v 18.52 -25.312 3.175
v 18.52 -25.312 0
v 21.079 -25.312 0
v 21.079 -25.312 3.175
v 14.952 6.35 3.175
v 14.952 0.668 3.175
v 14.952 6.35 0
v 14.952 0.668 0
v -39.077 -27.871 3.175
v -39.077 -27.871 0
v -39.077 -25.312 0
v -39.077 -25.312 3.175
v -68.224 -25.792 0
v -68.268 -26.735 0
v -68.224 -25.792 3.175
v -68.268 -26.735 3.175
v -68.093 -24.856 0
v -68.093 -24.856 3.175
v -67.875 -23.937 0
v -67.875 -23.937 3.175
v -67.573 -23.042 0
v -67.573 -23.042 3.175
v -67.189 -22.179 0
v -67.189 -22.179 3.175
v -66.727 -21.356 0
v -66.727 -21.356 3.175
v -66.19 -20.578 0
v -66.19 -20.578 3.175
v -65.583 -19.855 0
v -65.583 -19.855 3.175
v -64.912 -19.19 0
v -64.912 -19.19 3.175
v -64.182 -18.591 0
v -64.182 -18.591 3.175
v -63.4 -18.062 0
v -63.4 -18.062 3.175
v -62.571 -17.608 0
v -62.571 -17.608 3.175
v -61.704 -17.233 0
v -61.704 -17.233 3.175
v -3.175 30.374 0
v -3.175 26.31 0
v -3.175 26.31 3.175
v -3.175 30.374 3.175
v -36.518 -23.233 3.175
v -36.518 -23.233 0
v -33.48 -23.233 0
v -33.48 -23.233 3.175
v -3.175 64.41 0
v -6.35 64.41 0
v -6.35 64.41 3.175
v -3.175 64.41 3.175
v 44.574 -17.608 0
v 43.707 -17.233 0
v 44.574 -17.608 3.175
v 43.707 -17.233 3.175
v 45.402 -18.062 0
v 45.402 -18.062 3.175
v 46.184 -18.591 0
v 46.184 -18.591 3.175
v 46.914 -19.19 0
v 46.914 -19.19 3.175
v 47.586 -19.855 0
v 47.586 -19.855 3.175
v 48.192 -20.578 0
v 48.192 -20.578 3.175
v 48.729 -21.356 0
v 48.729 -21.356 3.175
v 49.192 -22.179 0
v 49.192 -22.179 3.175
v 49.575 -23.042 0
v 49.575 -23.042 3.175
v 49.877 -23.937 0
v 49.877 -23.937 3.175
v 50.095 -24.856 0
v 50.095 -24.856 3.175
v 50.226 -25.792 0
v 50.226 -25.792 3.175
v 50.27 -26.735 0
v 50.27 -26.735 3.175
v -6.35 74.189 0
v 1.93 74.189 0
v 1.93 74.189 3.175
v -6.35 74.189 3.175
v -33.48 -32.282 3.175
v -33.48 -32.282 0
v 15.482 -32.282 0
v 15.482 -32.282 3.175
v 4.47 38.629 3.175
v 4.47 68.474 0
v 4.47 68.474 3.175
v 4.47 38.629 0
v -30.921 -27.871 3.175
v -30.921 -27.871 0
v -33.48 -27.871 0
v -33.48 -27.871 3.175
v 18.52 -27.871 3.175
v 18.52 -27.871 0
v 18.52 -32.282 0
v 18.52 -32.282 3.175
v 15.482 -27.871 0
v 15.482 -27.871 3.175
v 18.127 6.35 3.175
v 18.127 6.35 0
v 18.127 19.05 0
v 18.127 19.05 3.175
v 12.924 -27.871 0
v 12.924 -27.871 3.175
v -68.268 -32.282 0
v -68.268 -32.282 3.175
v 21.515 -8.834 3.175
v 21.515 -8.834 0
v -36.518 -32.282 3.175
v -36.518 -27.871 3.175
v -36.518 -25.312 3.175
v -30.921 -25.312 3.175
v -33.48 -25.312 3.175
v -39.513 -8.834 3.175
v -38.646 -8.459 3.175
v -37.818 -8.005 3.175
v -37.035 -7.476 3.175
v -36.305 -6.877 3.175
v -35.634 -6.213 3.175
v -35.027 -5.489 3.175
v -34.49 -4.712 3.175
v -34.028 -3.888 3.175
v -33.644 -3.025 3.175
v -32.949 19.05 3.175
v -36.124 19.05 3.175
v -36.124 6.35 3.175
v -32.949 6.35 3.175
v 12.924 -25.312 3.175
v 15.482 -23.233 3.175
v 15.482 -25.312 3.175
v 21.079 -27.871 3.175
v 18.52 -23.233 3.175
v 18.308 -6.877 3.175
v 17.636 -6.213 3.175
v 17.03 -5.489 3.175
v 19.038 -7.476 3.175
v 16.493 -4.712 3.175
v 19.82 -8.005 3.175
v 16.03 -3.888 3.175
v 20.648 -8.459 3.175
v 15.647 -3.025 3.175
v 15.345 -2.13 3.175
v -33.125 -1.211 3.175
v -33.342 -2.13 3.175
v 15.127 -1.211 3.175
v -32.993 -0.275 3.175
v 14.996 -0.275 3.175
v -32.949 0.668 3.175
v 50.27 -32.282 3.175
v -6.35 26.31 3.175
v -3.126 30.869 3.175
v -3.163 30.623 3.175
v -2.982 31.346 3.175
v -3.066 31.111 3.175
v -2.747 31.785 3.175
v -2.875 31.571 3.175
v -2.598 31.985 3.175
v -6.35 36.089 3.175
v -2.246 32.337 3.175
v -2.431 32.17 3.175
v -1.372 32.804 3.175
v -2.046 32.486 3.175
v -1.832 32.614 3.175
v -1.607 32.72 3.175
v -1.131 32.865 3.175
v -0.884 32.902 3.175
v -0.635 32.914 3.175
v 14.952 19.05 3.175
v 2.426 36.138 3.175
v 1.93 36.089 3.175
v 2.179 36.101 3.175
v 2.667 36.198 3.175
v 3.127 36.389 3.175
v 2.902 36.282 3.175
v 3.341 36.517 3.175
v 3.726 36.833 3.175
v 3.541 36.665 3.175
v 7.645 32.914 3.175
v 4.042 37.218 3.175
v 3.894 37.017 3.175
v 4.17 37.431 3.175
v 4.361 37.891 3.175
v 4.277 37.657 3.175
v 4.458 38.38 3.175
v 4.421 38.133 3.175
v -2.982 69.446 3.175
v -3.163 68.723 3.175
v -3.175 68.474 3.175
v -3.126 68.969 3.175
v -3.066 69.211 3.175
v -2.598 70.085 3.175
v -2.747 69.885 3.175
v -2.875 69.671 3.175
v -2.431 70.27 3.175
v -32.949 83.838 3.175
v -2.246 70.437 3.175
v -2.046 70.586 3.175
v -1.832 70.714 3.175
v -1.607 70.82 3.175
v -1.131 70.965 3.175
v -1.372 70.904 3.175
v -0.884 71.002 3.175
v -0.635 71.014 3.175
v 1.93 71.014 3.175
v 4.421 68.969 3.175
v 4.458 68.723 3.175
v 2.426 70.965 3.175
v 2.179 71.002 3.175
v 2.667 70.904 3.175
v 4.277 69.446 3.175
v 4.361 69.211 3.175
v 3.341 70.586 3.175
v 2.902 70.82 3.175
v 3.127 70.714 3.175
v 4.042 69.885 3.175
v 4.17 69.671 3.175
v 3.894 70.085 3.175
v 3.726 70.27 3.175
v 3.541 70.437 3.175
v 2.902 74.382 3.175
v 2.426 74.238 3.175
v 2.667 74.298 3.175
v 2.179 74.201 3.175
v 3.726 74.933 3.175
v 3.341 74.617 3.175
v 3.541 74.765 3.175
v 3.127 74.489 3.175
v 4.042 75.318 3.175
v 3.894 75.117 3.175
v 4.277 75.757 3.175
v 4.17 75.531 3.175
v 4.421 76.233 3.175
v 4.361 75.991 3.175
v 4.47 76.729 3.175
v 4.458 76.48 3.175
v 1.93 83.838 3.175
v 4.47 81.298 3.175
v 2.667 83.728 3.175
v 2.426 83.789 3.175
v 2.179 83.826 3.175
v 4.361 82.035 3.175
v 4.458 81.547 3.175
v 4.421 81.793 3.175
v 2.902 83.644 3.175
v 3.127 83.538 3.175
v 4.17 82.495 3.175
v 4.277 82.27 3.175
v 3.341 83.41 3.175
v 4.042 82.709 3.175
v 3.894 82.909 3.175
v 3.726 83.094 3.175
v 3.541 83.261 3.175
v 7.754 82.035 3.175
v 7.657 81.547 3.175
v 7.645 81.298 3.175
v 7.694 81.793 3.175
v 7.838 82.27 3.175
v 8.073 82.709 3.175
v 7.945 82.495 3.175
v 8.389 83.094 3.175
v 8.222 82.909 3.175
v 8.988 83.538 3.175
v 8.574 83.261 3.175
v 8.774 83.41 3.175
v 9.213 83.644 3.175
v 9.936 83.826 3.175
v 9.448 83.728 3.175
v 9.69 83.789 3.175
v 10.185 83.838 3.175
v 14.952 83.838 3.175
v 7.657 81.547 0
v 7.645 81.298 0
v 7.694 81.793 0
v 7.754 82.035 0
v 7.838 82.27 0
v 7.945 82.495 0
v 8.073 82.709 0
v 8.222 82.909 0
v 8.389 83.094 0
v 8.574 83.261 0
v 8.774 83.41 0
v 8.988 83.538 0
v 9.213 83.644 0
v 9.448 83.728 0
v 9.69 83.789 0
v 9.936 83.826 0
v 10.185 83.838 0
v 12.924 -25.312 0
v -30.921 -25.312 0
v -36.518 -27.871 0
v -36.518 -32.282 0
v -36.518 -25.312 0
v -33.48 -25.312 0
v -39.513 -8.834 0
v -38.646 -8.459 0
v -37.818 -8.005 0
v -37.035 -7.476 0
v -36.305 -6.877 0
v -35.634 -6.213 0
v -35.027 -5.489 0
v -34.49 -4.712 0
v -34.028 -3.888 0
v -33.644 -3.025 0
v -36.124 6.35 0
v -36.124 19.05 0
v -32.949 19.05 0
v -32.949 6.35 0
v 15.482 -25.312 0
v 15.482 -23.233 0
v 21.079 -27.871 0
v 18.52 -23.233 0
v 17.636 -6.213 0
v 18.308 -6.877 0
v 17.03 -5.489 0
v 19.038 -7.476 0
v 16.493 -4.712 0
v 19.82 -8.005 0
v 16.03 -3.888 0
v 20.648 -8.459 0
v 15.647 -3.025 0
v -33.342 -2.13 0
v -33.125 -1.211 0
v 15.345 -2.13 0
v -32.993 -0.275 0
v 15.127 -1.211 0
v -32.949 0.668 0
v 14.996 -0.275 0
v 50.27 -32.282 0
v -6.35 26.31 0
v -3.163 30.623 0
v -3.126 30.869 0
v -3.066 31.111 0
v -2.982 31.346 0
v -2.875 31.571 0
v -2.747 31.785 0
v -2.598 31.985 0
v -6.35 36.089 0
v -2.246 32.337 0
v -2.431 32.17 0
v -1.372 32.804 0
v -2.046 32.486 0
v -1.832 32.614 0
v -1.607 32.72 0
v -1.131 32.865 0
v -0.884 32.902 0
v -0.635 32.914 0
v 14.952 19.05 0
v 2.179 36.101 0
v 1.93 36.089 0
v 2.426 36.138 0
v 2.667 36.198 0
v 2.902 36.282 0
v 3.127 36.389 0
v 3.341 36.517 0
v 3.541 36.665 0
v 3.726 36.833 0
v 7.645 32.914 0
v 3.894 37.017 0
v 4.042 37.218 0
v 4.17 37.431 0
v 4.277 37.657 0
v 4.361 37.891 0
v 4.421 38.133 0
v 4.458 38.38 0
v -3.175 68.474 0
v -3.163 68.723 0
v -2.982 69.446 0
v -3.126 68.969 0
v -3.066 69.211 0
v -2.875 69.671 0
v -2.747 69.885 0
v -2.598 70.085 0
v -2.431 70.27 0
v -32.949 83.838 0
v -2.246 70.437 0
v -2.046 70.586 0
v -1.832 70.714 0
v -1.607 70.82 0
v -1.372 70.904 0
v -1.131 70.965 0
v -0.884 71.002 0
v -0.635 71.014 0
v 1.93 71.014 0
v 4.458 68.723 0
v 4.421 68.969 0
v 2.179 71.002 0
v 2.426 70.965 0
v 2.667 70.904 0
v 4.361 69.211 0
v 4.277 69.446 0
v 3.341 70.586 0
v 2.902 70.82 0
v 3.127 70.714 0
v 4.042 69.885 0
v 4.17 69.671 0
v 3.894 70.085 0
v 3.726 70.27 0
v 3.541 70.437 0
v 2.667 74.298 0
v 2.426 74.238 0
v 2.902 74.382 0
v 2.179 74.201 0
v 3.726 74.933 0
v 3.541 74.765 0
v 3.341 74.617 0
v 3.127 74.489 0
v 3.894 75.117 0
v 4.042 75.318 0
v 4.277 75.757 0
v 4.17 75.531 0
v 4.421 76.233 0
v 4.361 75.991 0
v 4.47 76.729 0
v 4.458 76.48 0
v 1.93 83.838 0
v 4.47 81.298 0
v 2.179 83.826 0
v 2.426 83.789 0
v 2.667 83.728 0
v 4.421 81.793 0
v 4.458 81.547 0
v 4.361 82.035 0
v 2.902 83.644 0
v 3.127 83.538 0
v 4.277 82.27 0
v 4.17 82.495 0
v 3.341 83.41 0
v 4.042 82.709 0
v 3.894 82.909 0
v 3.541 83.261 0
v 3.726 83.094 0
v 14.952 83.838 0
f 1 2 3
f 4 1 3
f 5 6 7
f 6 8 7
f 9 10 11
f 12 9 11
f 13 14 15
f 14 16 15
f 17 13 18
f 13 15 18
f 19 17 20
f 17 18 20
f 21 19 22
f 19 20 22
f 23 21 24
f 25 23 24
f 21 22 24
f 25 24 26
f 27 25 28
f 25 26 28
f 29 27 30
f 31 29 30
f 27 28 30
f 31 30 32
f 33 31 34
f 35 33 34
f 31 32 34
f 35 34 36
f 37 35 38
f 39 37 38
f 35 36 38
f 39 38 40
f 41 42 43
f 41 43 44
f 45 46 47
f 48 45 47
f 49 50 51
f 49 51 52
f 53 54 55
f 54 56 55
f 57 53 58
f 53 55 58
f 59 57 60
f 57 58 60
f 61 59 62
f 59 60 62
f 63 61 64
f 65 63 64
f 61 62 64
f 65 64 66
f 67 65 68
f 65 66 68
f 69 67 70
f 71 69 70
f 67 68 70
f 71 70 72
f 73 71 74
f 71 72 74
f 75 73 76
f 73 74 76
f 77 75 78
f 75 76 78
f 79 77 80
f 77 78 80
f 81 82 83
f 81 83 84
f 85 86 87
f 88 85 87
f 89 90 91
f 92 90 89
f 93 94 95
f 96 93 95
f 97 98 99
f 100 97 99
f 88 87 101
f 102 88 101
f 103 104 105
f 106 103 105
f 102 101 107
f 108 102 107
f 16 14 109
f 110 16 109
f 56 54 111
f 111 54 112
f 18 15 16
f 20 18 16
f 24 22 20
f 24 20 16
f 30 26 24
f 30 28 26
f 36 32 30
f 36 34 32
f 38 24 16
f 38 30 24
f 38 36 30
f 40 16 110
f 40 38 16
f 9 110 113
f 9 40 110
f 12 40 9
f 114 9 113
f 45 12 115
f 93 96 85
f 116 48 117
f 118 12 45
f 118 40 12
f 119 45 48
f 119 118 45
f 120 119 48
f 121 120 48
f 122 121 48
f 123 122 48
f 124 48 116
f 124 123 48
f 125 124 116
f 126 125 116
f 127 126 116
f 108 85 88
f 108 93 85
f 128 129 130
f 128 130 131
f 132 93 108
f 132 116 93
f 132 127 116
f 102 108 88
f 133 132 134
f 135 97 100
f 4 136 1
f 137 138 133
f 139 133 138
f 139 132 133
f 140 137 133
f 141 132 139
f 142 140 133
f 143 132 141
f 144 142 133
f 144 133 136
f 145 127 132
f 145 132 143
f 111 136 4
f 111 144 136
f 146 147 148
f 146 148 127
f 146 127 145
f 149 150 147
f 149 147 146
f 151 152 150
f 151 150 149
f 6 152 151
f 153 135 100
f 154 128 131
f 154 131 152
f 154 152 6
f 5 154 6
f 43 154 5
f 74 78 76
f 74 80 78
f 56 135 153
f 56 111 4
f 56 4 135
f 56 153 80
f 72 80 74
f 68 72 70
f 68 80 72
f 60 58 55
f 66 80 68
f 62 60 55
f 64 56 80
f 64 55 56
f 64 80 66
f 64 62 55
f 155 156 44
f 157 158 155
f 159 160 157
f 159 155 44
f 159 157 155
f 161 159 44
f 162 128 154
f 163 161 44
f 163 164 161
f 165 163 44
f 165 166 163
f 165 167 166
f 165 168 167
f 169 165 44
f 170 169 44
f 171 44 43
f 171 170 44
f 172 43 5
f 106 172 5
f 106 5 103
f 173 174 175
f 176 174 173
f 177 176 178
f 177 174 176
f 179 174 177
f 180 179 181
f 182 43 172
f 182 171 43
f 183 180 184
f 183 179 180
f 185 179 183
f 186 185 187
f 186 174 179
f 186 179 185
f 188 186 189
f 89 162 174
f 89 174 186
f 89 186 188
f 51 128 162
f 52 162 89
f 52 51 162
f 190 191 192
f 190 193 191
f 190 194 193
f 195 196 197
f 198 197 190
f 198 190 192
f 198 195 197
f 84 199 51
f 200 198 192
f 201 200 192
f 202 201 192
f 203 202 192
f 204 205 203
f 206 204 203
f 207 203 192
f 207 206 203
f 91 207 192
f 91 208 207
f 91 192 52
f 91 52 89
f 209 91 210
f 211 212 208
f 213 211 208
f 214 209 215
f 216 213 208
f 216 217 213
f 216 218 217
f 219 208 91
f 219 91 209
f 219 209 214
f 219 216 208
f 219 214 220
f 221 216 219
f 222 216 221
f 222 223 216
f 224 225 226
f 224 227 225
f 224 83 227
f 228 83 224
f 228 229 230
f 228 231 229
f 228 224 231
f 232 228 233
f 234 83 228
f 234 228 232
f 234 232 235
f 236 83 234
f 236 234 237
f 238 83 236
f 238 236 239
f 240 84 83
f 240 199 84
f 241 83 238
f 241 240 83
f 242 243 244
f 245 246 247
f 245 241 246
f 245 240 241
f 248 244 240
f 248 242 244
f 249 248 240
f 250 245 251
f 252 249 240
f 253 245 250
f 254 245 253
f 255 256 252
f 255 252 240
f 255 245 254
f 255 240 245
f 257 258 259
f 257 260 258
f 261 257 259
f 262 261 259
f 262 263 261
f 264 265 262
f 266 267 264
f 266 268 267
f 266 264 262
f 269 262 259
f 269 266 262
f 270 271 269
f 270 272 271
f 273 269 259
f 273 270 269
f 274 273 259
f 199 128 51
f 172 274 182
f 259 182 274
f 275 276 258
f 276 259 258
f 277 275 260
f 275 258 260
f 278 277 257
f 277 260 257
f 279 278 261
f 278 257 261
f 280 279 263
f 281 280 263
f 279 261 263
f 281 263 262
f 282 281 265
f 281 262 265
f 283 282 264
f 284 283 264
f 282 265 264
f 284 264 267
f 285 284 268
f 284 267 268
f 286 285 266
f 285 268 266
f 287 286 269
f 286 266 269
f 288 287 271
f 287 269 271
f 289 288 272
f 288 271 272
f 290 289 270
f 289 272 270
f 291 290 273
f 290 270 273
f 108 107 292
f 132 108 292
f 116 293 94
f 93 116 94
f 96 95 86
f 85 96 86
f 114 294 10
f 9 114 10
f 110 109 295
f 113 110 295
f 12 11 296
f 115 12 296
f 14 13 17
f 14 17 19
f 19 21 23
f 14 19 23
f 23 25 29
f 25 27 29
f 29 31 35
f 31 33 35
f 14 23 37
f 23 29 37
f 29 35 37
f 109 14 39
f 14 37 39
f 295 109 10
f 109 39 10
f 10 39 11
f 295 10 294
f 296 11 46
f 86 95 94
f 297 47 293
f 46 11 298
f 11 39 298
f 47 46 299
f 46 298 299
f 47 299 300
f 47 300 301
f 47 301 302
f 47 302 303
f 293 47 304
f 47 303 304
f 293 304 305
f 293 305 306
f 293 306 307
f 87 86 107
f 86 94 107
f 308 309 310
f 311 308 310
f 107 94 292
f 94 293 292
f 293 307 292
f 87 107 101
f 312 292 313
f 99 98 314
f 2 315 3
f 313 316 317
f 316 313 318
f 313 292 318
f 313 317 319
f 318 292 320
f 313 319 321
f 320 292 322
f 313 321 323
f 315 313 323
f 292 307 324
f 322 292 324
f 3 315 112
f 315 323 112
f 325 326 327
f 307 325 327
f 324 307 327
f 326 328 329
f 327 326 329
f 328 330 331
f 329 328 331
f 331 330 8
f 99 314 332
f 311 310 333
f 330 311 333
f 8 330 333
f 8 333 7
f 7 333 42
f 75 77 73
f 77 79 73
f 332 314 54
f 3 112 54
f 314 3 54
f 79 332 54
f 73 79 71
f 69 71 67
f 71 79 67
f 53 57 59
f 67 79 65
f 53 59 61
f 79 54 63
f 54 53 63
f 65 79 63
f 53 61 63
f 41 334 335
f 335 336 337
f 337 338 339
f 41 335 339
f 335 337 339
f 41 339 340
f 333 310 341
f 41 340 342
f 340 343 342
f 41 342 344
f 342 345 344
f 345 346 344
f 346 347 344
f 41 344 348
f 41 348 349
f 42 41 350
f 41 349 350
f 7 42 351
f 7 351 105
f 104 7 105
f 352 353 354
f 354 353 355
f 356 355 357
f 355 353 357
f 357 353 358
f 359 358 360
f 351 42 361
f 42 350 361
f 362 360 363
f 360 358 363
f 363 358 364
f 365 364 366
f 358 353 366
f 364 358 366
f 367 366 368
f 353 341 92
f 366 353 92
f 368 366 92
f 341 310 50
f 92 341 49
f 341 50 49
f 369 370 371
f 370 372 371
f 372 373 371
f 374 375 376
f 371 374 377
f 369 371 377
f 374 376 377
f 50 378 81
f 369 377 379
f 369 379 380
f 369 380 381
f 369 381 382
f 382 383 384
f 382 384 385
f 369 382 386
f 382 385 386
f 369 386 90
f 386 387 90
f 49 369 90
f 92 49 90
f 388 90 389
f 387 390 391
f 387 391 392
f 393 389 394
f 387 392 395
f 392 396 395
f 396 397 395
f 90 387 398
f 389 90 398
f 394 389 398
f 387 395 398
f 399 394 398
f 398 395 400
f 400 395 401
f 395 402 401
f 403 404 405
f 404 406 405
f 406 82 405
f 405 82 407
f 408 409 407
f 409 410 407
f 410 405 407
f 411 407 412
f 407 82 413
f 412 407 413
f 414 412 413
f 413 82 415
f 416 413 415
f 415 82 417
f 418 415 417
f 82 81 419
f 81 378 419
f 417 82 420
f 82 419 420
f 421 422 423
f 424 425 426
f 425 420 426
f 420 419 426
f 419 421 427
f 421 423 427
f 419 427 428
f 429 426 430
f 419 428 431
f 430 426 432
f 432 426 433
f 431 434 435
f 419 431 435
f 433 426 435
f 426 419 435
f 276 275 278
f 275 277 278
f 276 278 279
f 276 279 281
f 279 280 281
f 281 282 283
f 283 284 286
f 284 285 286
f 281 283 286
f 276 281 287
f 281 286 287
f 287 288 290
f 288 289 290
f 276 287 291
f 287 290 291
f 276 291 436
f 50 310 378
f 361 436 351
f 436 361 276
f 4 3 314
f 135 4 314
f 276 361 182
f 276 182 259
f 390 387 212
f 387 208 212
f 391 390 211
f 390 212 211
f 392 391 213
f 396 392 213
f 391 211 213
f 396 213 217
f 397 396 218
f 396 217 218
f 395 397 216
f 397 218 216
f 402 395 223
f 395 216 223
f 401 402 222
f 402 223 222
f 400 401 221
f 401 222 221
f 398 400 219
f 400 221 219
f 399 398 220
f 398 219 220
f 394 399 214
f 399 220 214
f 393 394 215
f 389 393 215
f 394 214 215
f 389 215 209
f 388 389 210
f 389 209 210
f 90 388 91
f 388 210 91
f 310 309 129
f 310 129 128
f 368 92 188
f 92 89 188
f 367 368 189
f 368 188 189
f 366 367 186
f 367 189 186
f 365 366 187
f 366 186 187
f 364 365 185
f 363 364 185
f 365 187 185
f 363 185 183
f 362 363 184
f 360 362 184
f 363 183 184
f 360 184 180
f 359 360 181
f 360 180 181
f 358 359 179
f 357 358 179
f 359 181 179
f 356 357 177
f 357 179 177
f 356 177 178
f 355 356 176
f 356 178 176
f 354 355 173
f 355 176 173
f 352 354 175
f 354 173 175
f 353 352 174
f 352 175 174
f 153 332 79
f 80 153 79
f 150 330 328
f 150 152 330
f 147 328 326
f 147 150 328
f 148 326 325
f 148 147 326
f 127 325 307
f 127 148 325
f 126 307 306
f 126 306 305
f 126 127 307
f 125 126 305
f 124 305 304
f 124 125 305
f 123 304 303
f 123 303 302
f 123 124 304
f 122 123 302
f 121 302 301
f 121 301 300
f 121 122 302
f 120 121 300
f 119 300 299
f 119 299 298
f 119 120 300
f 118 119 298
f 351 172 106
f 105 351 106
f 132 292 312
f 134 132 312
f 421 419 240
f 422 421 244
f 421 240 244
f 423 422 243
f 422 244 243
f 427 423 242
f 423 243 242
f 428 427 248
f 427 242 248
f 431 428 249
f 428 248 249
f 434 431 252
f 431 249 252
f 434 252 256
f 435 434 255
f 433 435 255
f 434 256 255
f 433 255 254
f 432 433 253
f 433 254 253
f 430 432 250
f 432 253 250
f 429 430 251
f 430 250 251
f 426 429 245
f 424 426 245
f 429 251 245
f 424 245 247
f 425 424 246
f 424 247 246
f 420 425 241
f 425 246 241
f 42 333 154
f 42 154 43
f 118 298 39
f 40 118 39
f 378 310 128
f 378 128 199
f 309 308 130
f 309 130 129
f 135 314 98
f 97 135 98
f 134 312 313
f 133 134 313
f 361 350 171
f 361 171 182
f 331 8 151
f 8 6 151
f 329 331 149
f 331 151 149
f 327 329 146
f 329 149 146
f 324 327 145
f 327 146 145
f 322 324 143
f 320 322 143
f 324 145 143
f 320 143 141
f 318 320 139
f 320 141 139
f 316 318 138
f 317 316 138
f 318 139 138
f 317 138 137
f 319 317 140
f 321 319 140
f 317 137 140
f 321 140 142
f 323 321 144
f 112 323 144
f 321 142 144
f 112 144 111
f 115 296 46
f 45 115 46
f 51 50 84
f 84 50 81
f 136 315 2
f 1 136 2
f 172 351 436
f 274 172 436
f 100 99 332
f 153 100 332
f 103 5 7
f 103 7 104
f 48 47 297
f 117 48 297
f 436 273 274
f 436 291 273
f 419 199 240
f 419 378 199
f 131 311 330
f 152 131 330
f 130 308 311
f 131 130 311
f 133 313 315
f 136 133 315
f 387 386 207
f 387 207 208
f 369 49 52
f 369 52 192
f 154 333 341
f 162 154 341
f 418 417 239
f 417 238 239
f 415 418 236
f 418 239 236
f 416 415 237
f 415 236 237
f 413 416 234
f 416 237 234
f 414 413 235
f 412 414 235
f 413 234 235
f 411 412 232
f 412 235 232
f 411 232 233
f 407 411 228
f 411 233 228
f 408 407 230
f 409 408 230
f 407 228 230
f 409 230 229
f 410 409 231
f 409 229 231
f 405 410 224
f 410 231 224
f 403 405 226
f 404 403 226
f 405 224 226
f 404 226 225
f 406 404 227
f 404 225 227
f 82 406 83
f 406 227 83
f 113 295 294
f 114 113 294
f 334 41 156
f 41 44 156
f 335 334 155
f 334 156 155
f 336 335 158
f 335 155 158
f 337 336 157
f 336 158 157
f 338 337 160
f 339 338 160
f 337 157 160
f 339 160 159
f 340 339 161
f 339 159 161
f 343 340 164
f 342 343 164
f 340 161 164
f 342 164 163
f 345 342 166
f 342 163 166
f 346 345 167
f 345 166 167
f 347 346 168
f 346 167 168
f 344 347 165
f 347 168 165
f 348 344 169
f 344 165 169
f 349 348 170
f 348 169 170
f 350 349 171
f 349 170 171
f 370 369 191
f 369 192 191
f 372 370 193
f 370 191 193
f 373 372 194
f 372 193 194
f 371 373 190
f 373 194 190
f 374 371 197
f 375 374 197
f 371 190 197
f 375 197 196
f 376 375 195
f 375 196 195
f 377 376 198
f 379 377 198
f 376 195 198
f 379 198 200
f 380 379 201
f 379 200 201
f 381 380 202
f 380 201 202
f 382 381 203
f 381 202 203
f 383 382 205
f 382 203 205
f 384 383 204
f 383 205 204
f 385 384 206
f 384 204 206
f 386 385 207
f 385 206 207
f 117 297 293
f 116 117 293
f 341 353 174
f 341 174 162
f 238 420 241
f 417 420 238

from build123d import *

# Parameters (mm, degrees)
BOSS_EXTRUDE1_DEPTH = 3.175
SKETCH2_W           = 5.42671
SKETCH2_H           = 83.83778
SKETCH2_W_2         = 23.424388
BOSS_EXTRUDE2_DEPTH = 3.175
SKETCH3_W           = 3.175
SKETCH3_H           = 64.78778
SKETCH3_H_2         = 6.35
CUT_EXTRUDE2_DEPTH  = 92.344542194
BOSS_EXTRUDE4_DEPTH = 3.175
FILLET1_R           = 10.16
CUT_EXTRUDE5_DEPTH  = 109.16364837
FILLET2_R           = 2.54


with BuildPart() as part:
    # Sketch1 → Boss-Extrude1 (new body)
    with BuildSketch(Plane.XY):
        Polygon((4.470127528, 71.013782114), (4.470127528, 36.088782114), (-6.35, 36.088782114), (-6.35, 32.913782114), (-6.35, 26.309782114), (-3.175, 26.309782114), (-3.175, 32.913782114), (7.645127528, 32.913782114), (7.645127528, 83.83778), (12.7, 83.83778), (12.7, 0), (-12.7, 0), (-12.7, 83.83778), (4.470127528, 83.83778), (4.470127528, 74.188782114), (-6.35, 74.188782114), (-6.35, 71.013782114), (-6.35, 64.409782114), (-3.175, 64.409782114), (-3.175, 71.013782114), align=None)
    extrude(amount=BOSS_EXTRUDE1_DEPTH)

    # Sketch2 → Boss-Extrude2 (add)
    with BuildSketch(Plane.XY):
        with Locations((15.413355, 41.91889)):
            Rectangle(SKETCH2_W, SKETCH2_H)
        with Locations((-24.412194, 41.91889)):
            Rectangle(SKETCH2_W_2, SKETCH2_H)
    extrude(amount=BOSS_EXTRUDE2_DEPTH)

    # Sketch3 → Cut-Extrude2 (cut, through all)
    with BuildSketch(Plane.XY):
        with Locations((-34.536888, 51.44389)):
            Rectangle(SKETCH3_W, SKETCH3_H)
        with Locations((16.53921, 51.44389)):
            Rectangle(SKETCH3_W, SKETCH3_H)
        with Locations((-34.536888, 3.175)):
            Rectangle(SKETCH3_W, SKETCH3_H_2)
        with Locations((16.53921, 3.175)):
            Rectangle(SKETCH3_W, SKETCH3_H_2)
    extrude(amount=CUT_EXTRUDE2_DEPTH, mode=Mode.SUBTRACT)

    # Sketch5 → Boss-Extrude4 (add)
    with BuildSketch(Plane.XY):
        Polygon((-32.949388, 0), (-32.949388, -6.35), (-68.268007503, -19.717143922), (-68.268007503, -32.282068045), (50.270329503, -32.282068045), (50.270329503, -19.717143922), (14.95171, -6.35), (14.95171, 0), align=None)
    extrude(amount=BOSS_EXTRUDE4_DEPTH)

    # Fillet1
    fillet1_edges = [part.edges().sort_by_distance(p)[0] for p in [
        (-32.949388, -6.35, 1.5875),
        (-68.268007503, -19.717143922, 1.5875),
        (50.270329503, -19.717143922, 1.5875),
        (14.95171, -6.35, 1.5875),
    ]]
    fillet(fillet1_edges, radius=FILLET1_R)

    # Sketch6 → Cut-Extrude5 (cut, through all)
    with BuildSketch(Plane.XY):
        Polygon((-36.518007503, -32.282068045), (-36.518007503, -27.870697677), (-39.076507827, -27.870697677), (-39.076507827, -25.312197354), (-36.518007503, -25.312197354), (-36.518007503, -23.233415841), (-33.479788369, -23.233415841), (-33.479788369, -25.312197354), (-30.921288046, -25.312197354), (-30.921288046, -27.870697677), (-33.479788369, -27.870697677), (-33.479788369, -32.282068045), align=None)
        Polygon((15.482110369, -32.282068045), (15.482110369, -27.870697677), (12.923610046, -27.870697677), (12.923610046, -25.312197354), (15.482110369, -25.312197354), (15.482110369, -23.233415841), (18.520329503, -23.233415841), (18.520329503, -25.312197354), (21.078829827, -25.312197354), (21.078829827, -27.870697677), (18.520329503, -27.870697677), (18.520329503, -32.282068045), align=None)
    extrude(amount=CUT_EXTRUDE5_DEPTH, mode=Mode.SUBTRACT)

    # Fillet2
    fillet2_edges = [part.edges().sort_by_distance(p)[0] for p in [
        (4.470127528, 83.83778, 1.5875),
        (4.470127528, 74.188782114, 1.5875),
        (-3.175, 71.013782114, 1.5875),
        (4.470127528, 71.013782114, 1.5875),
        (4.470127528, 36.088782114, 1.5875),
        (-3.175, 32.913782114, 1.5875),
        (7.645127528, 83.83778, 1.5875),
    ]]
    fillet(fillet2_edges, radius=FILLET2_R)


solid = part.part
